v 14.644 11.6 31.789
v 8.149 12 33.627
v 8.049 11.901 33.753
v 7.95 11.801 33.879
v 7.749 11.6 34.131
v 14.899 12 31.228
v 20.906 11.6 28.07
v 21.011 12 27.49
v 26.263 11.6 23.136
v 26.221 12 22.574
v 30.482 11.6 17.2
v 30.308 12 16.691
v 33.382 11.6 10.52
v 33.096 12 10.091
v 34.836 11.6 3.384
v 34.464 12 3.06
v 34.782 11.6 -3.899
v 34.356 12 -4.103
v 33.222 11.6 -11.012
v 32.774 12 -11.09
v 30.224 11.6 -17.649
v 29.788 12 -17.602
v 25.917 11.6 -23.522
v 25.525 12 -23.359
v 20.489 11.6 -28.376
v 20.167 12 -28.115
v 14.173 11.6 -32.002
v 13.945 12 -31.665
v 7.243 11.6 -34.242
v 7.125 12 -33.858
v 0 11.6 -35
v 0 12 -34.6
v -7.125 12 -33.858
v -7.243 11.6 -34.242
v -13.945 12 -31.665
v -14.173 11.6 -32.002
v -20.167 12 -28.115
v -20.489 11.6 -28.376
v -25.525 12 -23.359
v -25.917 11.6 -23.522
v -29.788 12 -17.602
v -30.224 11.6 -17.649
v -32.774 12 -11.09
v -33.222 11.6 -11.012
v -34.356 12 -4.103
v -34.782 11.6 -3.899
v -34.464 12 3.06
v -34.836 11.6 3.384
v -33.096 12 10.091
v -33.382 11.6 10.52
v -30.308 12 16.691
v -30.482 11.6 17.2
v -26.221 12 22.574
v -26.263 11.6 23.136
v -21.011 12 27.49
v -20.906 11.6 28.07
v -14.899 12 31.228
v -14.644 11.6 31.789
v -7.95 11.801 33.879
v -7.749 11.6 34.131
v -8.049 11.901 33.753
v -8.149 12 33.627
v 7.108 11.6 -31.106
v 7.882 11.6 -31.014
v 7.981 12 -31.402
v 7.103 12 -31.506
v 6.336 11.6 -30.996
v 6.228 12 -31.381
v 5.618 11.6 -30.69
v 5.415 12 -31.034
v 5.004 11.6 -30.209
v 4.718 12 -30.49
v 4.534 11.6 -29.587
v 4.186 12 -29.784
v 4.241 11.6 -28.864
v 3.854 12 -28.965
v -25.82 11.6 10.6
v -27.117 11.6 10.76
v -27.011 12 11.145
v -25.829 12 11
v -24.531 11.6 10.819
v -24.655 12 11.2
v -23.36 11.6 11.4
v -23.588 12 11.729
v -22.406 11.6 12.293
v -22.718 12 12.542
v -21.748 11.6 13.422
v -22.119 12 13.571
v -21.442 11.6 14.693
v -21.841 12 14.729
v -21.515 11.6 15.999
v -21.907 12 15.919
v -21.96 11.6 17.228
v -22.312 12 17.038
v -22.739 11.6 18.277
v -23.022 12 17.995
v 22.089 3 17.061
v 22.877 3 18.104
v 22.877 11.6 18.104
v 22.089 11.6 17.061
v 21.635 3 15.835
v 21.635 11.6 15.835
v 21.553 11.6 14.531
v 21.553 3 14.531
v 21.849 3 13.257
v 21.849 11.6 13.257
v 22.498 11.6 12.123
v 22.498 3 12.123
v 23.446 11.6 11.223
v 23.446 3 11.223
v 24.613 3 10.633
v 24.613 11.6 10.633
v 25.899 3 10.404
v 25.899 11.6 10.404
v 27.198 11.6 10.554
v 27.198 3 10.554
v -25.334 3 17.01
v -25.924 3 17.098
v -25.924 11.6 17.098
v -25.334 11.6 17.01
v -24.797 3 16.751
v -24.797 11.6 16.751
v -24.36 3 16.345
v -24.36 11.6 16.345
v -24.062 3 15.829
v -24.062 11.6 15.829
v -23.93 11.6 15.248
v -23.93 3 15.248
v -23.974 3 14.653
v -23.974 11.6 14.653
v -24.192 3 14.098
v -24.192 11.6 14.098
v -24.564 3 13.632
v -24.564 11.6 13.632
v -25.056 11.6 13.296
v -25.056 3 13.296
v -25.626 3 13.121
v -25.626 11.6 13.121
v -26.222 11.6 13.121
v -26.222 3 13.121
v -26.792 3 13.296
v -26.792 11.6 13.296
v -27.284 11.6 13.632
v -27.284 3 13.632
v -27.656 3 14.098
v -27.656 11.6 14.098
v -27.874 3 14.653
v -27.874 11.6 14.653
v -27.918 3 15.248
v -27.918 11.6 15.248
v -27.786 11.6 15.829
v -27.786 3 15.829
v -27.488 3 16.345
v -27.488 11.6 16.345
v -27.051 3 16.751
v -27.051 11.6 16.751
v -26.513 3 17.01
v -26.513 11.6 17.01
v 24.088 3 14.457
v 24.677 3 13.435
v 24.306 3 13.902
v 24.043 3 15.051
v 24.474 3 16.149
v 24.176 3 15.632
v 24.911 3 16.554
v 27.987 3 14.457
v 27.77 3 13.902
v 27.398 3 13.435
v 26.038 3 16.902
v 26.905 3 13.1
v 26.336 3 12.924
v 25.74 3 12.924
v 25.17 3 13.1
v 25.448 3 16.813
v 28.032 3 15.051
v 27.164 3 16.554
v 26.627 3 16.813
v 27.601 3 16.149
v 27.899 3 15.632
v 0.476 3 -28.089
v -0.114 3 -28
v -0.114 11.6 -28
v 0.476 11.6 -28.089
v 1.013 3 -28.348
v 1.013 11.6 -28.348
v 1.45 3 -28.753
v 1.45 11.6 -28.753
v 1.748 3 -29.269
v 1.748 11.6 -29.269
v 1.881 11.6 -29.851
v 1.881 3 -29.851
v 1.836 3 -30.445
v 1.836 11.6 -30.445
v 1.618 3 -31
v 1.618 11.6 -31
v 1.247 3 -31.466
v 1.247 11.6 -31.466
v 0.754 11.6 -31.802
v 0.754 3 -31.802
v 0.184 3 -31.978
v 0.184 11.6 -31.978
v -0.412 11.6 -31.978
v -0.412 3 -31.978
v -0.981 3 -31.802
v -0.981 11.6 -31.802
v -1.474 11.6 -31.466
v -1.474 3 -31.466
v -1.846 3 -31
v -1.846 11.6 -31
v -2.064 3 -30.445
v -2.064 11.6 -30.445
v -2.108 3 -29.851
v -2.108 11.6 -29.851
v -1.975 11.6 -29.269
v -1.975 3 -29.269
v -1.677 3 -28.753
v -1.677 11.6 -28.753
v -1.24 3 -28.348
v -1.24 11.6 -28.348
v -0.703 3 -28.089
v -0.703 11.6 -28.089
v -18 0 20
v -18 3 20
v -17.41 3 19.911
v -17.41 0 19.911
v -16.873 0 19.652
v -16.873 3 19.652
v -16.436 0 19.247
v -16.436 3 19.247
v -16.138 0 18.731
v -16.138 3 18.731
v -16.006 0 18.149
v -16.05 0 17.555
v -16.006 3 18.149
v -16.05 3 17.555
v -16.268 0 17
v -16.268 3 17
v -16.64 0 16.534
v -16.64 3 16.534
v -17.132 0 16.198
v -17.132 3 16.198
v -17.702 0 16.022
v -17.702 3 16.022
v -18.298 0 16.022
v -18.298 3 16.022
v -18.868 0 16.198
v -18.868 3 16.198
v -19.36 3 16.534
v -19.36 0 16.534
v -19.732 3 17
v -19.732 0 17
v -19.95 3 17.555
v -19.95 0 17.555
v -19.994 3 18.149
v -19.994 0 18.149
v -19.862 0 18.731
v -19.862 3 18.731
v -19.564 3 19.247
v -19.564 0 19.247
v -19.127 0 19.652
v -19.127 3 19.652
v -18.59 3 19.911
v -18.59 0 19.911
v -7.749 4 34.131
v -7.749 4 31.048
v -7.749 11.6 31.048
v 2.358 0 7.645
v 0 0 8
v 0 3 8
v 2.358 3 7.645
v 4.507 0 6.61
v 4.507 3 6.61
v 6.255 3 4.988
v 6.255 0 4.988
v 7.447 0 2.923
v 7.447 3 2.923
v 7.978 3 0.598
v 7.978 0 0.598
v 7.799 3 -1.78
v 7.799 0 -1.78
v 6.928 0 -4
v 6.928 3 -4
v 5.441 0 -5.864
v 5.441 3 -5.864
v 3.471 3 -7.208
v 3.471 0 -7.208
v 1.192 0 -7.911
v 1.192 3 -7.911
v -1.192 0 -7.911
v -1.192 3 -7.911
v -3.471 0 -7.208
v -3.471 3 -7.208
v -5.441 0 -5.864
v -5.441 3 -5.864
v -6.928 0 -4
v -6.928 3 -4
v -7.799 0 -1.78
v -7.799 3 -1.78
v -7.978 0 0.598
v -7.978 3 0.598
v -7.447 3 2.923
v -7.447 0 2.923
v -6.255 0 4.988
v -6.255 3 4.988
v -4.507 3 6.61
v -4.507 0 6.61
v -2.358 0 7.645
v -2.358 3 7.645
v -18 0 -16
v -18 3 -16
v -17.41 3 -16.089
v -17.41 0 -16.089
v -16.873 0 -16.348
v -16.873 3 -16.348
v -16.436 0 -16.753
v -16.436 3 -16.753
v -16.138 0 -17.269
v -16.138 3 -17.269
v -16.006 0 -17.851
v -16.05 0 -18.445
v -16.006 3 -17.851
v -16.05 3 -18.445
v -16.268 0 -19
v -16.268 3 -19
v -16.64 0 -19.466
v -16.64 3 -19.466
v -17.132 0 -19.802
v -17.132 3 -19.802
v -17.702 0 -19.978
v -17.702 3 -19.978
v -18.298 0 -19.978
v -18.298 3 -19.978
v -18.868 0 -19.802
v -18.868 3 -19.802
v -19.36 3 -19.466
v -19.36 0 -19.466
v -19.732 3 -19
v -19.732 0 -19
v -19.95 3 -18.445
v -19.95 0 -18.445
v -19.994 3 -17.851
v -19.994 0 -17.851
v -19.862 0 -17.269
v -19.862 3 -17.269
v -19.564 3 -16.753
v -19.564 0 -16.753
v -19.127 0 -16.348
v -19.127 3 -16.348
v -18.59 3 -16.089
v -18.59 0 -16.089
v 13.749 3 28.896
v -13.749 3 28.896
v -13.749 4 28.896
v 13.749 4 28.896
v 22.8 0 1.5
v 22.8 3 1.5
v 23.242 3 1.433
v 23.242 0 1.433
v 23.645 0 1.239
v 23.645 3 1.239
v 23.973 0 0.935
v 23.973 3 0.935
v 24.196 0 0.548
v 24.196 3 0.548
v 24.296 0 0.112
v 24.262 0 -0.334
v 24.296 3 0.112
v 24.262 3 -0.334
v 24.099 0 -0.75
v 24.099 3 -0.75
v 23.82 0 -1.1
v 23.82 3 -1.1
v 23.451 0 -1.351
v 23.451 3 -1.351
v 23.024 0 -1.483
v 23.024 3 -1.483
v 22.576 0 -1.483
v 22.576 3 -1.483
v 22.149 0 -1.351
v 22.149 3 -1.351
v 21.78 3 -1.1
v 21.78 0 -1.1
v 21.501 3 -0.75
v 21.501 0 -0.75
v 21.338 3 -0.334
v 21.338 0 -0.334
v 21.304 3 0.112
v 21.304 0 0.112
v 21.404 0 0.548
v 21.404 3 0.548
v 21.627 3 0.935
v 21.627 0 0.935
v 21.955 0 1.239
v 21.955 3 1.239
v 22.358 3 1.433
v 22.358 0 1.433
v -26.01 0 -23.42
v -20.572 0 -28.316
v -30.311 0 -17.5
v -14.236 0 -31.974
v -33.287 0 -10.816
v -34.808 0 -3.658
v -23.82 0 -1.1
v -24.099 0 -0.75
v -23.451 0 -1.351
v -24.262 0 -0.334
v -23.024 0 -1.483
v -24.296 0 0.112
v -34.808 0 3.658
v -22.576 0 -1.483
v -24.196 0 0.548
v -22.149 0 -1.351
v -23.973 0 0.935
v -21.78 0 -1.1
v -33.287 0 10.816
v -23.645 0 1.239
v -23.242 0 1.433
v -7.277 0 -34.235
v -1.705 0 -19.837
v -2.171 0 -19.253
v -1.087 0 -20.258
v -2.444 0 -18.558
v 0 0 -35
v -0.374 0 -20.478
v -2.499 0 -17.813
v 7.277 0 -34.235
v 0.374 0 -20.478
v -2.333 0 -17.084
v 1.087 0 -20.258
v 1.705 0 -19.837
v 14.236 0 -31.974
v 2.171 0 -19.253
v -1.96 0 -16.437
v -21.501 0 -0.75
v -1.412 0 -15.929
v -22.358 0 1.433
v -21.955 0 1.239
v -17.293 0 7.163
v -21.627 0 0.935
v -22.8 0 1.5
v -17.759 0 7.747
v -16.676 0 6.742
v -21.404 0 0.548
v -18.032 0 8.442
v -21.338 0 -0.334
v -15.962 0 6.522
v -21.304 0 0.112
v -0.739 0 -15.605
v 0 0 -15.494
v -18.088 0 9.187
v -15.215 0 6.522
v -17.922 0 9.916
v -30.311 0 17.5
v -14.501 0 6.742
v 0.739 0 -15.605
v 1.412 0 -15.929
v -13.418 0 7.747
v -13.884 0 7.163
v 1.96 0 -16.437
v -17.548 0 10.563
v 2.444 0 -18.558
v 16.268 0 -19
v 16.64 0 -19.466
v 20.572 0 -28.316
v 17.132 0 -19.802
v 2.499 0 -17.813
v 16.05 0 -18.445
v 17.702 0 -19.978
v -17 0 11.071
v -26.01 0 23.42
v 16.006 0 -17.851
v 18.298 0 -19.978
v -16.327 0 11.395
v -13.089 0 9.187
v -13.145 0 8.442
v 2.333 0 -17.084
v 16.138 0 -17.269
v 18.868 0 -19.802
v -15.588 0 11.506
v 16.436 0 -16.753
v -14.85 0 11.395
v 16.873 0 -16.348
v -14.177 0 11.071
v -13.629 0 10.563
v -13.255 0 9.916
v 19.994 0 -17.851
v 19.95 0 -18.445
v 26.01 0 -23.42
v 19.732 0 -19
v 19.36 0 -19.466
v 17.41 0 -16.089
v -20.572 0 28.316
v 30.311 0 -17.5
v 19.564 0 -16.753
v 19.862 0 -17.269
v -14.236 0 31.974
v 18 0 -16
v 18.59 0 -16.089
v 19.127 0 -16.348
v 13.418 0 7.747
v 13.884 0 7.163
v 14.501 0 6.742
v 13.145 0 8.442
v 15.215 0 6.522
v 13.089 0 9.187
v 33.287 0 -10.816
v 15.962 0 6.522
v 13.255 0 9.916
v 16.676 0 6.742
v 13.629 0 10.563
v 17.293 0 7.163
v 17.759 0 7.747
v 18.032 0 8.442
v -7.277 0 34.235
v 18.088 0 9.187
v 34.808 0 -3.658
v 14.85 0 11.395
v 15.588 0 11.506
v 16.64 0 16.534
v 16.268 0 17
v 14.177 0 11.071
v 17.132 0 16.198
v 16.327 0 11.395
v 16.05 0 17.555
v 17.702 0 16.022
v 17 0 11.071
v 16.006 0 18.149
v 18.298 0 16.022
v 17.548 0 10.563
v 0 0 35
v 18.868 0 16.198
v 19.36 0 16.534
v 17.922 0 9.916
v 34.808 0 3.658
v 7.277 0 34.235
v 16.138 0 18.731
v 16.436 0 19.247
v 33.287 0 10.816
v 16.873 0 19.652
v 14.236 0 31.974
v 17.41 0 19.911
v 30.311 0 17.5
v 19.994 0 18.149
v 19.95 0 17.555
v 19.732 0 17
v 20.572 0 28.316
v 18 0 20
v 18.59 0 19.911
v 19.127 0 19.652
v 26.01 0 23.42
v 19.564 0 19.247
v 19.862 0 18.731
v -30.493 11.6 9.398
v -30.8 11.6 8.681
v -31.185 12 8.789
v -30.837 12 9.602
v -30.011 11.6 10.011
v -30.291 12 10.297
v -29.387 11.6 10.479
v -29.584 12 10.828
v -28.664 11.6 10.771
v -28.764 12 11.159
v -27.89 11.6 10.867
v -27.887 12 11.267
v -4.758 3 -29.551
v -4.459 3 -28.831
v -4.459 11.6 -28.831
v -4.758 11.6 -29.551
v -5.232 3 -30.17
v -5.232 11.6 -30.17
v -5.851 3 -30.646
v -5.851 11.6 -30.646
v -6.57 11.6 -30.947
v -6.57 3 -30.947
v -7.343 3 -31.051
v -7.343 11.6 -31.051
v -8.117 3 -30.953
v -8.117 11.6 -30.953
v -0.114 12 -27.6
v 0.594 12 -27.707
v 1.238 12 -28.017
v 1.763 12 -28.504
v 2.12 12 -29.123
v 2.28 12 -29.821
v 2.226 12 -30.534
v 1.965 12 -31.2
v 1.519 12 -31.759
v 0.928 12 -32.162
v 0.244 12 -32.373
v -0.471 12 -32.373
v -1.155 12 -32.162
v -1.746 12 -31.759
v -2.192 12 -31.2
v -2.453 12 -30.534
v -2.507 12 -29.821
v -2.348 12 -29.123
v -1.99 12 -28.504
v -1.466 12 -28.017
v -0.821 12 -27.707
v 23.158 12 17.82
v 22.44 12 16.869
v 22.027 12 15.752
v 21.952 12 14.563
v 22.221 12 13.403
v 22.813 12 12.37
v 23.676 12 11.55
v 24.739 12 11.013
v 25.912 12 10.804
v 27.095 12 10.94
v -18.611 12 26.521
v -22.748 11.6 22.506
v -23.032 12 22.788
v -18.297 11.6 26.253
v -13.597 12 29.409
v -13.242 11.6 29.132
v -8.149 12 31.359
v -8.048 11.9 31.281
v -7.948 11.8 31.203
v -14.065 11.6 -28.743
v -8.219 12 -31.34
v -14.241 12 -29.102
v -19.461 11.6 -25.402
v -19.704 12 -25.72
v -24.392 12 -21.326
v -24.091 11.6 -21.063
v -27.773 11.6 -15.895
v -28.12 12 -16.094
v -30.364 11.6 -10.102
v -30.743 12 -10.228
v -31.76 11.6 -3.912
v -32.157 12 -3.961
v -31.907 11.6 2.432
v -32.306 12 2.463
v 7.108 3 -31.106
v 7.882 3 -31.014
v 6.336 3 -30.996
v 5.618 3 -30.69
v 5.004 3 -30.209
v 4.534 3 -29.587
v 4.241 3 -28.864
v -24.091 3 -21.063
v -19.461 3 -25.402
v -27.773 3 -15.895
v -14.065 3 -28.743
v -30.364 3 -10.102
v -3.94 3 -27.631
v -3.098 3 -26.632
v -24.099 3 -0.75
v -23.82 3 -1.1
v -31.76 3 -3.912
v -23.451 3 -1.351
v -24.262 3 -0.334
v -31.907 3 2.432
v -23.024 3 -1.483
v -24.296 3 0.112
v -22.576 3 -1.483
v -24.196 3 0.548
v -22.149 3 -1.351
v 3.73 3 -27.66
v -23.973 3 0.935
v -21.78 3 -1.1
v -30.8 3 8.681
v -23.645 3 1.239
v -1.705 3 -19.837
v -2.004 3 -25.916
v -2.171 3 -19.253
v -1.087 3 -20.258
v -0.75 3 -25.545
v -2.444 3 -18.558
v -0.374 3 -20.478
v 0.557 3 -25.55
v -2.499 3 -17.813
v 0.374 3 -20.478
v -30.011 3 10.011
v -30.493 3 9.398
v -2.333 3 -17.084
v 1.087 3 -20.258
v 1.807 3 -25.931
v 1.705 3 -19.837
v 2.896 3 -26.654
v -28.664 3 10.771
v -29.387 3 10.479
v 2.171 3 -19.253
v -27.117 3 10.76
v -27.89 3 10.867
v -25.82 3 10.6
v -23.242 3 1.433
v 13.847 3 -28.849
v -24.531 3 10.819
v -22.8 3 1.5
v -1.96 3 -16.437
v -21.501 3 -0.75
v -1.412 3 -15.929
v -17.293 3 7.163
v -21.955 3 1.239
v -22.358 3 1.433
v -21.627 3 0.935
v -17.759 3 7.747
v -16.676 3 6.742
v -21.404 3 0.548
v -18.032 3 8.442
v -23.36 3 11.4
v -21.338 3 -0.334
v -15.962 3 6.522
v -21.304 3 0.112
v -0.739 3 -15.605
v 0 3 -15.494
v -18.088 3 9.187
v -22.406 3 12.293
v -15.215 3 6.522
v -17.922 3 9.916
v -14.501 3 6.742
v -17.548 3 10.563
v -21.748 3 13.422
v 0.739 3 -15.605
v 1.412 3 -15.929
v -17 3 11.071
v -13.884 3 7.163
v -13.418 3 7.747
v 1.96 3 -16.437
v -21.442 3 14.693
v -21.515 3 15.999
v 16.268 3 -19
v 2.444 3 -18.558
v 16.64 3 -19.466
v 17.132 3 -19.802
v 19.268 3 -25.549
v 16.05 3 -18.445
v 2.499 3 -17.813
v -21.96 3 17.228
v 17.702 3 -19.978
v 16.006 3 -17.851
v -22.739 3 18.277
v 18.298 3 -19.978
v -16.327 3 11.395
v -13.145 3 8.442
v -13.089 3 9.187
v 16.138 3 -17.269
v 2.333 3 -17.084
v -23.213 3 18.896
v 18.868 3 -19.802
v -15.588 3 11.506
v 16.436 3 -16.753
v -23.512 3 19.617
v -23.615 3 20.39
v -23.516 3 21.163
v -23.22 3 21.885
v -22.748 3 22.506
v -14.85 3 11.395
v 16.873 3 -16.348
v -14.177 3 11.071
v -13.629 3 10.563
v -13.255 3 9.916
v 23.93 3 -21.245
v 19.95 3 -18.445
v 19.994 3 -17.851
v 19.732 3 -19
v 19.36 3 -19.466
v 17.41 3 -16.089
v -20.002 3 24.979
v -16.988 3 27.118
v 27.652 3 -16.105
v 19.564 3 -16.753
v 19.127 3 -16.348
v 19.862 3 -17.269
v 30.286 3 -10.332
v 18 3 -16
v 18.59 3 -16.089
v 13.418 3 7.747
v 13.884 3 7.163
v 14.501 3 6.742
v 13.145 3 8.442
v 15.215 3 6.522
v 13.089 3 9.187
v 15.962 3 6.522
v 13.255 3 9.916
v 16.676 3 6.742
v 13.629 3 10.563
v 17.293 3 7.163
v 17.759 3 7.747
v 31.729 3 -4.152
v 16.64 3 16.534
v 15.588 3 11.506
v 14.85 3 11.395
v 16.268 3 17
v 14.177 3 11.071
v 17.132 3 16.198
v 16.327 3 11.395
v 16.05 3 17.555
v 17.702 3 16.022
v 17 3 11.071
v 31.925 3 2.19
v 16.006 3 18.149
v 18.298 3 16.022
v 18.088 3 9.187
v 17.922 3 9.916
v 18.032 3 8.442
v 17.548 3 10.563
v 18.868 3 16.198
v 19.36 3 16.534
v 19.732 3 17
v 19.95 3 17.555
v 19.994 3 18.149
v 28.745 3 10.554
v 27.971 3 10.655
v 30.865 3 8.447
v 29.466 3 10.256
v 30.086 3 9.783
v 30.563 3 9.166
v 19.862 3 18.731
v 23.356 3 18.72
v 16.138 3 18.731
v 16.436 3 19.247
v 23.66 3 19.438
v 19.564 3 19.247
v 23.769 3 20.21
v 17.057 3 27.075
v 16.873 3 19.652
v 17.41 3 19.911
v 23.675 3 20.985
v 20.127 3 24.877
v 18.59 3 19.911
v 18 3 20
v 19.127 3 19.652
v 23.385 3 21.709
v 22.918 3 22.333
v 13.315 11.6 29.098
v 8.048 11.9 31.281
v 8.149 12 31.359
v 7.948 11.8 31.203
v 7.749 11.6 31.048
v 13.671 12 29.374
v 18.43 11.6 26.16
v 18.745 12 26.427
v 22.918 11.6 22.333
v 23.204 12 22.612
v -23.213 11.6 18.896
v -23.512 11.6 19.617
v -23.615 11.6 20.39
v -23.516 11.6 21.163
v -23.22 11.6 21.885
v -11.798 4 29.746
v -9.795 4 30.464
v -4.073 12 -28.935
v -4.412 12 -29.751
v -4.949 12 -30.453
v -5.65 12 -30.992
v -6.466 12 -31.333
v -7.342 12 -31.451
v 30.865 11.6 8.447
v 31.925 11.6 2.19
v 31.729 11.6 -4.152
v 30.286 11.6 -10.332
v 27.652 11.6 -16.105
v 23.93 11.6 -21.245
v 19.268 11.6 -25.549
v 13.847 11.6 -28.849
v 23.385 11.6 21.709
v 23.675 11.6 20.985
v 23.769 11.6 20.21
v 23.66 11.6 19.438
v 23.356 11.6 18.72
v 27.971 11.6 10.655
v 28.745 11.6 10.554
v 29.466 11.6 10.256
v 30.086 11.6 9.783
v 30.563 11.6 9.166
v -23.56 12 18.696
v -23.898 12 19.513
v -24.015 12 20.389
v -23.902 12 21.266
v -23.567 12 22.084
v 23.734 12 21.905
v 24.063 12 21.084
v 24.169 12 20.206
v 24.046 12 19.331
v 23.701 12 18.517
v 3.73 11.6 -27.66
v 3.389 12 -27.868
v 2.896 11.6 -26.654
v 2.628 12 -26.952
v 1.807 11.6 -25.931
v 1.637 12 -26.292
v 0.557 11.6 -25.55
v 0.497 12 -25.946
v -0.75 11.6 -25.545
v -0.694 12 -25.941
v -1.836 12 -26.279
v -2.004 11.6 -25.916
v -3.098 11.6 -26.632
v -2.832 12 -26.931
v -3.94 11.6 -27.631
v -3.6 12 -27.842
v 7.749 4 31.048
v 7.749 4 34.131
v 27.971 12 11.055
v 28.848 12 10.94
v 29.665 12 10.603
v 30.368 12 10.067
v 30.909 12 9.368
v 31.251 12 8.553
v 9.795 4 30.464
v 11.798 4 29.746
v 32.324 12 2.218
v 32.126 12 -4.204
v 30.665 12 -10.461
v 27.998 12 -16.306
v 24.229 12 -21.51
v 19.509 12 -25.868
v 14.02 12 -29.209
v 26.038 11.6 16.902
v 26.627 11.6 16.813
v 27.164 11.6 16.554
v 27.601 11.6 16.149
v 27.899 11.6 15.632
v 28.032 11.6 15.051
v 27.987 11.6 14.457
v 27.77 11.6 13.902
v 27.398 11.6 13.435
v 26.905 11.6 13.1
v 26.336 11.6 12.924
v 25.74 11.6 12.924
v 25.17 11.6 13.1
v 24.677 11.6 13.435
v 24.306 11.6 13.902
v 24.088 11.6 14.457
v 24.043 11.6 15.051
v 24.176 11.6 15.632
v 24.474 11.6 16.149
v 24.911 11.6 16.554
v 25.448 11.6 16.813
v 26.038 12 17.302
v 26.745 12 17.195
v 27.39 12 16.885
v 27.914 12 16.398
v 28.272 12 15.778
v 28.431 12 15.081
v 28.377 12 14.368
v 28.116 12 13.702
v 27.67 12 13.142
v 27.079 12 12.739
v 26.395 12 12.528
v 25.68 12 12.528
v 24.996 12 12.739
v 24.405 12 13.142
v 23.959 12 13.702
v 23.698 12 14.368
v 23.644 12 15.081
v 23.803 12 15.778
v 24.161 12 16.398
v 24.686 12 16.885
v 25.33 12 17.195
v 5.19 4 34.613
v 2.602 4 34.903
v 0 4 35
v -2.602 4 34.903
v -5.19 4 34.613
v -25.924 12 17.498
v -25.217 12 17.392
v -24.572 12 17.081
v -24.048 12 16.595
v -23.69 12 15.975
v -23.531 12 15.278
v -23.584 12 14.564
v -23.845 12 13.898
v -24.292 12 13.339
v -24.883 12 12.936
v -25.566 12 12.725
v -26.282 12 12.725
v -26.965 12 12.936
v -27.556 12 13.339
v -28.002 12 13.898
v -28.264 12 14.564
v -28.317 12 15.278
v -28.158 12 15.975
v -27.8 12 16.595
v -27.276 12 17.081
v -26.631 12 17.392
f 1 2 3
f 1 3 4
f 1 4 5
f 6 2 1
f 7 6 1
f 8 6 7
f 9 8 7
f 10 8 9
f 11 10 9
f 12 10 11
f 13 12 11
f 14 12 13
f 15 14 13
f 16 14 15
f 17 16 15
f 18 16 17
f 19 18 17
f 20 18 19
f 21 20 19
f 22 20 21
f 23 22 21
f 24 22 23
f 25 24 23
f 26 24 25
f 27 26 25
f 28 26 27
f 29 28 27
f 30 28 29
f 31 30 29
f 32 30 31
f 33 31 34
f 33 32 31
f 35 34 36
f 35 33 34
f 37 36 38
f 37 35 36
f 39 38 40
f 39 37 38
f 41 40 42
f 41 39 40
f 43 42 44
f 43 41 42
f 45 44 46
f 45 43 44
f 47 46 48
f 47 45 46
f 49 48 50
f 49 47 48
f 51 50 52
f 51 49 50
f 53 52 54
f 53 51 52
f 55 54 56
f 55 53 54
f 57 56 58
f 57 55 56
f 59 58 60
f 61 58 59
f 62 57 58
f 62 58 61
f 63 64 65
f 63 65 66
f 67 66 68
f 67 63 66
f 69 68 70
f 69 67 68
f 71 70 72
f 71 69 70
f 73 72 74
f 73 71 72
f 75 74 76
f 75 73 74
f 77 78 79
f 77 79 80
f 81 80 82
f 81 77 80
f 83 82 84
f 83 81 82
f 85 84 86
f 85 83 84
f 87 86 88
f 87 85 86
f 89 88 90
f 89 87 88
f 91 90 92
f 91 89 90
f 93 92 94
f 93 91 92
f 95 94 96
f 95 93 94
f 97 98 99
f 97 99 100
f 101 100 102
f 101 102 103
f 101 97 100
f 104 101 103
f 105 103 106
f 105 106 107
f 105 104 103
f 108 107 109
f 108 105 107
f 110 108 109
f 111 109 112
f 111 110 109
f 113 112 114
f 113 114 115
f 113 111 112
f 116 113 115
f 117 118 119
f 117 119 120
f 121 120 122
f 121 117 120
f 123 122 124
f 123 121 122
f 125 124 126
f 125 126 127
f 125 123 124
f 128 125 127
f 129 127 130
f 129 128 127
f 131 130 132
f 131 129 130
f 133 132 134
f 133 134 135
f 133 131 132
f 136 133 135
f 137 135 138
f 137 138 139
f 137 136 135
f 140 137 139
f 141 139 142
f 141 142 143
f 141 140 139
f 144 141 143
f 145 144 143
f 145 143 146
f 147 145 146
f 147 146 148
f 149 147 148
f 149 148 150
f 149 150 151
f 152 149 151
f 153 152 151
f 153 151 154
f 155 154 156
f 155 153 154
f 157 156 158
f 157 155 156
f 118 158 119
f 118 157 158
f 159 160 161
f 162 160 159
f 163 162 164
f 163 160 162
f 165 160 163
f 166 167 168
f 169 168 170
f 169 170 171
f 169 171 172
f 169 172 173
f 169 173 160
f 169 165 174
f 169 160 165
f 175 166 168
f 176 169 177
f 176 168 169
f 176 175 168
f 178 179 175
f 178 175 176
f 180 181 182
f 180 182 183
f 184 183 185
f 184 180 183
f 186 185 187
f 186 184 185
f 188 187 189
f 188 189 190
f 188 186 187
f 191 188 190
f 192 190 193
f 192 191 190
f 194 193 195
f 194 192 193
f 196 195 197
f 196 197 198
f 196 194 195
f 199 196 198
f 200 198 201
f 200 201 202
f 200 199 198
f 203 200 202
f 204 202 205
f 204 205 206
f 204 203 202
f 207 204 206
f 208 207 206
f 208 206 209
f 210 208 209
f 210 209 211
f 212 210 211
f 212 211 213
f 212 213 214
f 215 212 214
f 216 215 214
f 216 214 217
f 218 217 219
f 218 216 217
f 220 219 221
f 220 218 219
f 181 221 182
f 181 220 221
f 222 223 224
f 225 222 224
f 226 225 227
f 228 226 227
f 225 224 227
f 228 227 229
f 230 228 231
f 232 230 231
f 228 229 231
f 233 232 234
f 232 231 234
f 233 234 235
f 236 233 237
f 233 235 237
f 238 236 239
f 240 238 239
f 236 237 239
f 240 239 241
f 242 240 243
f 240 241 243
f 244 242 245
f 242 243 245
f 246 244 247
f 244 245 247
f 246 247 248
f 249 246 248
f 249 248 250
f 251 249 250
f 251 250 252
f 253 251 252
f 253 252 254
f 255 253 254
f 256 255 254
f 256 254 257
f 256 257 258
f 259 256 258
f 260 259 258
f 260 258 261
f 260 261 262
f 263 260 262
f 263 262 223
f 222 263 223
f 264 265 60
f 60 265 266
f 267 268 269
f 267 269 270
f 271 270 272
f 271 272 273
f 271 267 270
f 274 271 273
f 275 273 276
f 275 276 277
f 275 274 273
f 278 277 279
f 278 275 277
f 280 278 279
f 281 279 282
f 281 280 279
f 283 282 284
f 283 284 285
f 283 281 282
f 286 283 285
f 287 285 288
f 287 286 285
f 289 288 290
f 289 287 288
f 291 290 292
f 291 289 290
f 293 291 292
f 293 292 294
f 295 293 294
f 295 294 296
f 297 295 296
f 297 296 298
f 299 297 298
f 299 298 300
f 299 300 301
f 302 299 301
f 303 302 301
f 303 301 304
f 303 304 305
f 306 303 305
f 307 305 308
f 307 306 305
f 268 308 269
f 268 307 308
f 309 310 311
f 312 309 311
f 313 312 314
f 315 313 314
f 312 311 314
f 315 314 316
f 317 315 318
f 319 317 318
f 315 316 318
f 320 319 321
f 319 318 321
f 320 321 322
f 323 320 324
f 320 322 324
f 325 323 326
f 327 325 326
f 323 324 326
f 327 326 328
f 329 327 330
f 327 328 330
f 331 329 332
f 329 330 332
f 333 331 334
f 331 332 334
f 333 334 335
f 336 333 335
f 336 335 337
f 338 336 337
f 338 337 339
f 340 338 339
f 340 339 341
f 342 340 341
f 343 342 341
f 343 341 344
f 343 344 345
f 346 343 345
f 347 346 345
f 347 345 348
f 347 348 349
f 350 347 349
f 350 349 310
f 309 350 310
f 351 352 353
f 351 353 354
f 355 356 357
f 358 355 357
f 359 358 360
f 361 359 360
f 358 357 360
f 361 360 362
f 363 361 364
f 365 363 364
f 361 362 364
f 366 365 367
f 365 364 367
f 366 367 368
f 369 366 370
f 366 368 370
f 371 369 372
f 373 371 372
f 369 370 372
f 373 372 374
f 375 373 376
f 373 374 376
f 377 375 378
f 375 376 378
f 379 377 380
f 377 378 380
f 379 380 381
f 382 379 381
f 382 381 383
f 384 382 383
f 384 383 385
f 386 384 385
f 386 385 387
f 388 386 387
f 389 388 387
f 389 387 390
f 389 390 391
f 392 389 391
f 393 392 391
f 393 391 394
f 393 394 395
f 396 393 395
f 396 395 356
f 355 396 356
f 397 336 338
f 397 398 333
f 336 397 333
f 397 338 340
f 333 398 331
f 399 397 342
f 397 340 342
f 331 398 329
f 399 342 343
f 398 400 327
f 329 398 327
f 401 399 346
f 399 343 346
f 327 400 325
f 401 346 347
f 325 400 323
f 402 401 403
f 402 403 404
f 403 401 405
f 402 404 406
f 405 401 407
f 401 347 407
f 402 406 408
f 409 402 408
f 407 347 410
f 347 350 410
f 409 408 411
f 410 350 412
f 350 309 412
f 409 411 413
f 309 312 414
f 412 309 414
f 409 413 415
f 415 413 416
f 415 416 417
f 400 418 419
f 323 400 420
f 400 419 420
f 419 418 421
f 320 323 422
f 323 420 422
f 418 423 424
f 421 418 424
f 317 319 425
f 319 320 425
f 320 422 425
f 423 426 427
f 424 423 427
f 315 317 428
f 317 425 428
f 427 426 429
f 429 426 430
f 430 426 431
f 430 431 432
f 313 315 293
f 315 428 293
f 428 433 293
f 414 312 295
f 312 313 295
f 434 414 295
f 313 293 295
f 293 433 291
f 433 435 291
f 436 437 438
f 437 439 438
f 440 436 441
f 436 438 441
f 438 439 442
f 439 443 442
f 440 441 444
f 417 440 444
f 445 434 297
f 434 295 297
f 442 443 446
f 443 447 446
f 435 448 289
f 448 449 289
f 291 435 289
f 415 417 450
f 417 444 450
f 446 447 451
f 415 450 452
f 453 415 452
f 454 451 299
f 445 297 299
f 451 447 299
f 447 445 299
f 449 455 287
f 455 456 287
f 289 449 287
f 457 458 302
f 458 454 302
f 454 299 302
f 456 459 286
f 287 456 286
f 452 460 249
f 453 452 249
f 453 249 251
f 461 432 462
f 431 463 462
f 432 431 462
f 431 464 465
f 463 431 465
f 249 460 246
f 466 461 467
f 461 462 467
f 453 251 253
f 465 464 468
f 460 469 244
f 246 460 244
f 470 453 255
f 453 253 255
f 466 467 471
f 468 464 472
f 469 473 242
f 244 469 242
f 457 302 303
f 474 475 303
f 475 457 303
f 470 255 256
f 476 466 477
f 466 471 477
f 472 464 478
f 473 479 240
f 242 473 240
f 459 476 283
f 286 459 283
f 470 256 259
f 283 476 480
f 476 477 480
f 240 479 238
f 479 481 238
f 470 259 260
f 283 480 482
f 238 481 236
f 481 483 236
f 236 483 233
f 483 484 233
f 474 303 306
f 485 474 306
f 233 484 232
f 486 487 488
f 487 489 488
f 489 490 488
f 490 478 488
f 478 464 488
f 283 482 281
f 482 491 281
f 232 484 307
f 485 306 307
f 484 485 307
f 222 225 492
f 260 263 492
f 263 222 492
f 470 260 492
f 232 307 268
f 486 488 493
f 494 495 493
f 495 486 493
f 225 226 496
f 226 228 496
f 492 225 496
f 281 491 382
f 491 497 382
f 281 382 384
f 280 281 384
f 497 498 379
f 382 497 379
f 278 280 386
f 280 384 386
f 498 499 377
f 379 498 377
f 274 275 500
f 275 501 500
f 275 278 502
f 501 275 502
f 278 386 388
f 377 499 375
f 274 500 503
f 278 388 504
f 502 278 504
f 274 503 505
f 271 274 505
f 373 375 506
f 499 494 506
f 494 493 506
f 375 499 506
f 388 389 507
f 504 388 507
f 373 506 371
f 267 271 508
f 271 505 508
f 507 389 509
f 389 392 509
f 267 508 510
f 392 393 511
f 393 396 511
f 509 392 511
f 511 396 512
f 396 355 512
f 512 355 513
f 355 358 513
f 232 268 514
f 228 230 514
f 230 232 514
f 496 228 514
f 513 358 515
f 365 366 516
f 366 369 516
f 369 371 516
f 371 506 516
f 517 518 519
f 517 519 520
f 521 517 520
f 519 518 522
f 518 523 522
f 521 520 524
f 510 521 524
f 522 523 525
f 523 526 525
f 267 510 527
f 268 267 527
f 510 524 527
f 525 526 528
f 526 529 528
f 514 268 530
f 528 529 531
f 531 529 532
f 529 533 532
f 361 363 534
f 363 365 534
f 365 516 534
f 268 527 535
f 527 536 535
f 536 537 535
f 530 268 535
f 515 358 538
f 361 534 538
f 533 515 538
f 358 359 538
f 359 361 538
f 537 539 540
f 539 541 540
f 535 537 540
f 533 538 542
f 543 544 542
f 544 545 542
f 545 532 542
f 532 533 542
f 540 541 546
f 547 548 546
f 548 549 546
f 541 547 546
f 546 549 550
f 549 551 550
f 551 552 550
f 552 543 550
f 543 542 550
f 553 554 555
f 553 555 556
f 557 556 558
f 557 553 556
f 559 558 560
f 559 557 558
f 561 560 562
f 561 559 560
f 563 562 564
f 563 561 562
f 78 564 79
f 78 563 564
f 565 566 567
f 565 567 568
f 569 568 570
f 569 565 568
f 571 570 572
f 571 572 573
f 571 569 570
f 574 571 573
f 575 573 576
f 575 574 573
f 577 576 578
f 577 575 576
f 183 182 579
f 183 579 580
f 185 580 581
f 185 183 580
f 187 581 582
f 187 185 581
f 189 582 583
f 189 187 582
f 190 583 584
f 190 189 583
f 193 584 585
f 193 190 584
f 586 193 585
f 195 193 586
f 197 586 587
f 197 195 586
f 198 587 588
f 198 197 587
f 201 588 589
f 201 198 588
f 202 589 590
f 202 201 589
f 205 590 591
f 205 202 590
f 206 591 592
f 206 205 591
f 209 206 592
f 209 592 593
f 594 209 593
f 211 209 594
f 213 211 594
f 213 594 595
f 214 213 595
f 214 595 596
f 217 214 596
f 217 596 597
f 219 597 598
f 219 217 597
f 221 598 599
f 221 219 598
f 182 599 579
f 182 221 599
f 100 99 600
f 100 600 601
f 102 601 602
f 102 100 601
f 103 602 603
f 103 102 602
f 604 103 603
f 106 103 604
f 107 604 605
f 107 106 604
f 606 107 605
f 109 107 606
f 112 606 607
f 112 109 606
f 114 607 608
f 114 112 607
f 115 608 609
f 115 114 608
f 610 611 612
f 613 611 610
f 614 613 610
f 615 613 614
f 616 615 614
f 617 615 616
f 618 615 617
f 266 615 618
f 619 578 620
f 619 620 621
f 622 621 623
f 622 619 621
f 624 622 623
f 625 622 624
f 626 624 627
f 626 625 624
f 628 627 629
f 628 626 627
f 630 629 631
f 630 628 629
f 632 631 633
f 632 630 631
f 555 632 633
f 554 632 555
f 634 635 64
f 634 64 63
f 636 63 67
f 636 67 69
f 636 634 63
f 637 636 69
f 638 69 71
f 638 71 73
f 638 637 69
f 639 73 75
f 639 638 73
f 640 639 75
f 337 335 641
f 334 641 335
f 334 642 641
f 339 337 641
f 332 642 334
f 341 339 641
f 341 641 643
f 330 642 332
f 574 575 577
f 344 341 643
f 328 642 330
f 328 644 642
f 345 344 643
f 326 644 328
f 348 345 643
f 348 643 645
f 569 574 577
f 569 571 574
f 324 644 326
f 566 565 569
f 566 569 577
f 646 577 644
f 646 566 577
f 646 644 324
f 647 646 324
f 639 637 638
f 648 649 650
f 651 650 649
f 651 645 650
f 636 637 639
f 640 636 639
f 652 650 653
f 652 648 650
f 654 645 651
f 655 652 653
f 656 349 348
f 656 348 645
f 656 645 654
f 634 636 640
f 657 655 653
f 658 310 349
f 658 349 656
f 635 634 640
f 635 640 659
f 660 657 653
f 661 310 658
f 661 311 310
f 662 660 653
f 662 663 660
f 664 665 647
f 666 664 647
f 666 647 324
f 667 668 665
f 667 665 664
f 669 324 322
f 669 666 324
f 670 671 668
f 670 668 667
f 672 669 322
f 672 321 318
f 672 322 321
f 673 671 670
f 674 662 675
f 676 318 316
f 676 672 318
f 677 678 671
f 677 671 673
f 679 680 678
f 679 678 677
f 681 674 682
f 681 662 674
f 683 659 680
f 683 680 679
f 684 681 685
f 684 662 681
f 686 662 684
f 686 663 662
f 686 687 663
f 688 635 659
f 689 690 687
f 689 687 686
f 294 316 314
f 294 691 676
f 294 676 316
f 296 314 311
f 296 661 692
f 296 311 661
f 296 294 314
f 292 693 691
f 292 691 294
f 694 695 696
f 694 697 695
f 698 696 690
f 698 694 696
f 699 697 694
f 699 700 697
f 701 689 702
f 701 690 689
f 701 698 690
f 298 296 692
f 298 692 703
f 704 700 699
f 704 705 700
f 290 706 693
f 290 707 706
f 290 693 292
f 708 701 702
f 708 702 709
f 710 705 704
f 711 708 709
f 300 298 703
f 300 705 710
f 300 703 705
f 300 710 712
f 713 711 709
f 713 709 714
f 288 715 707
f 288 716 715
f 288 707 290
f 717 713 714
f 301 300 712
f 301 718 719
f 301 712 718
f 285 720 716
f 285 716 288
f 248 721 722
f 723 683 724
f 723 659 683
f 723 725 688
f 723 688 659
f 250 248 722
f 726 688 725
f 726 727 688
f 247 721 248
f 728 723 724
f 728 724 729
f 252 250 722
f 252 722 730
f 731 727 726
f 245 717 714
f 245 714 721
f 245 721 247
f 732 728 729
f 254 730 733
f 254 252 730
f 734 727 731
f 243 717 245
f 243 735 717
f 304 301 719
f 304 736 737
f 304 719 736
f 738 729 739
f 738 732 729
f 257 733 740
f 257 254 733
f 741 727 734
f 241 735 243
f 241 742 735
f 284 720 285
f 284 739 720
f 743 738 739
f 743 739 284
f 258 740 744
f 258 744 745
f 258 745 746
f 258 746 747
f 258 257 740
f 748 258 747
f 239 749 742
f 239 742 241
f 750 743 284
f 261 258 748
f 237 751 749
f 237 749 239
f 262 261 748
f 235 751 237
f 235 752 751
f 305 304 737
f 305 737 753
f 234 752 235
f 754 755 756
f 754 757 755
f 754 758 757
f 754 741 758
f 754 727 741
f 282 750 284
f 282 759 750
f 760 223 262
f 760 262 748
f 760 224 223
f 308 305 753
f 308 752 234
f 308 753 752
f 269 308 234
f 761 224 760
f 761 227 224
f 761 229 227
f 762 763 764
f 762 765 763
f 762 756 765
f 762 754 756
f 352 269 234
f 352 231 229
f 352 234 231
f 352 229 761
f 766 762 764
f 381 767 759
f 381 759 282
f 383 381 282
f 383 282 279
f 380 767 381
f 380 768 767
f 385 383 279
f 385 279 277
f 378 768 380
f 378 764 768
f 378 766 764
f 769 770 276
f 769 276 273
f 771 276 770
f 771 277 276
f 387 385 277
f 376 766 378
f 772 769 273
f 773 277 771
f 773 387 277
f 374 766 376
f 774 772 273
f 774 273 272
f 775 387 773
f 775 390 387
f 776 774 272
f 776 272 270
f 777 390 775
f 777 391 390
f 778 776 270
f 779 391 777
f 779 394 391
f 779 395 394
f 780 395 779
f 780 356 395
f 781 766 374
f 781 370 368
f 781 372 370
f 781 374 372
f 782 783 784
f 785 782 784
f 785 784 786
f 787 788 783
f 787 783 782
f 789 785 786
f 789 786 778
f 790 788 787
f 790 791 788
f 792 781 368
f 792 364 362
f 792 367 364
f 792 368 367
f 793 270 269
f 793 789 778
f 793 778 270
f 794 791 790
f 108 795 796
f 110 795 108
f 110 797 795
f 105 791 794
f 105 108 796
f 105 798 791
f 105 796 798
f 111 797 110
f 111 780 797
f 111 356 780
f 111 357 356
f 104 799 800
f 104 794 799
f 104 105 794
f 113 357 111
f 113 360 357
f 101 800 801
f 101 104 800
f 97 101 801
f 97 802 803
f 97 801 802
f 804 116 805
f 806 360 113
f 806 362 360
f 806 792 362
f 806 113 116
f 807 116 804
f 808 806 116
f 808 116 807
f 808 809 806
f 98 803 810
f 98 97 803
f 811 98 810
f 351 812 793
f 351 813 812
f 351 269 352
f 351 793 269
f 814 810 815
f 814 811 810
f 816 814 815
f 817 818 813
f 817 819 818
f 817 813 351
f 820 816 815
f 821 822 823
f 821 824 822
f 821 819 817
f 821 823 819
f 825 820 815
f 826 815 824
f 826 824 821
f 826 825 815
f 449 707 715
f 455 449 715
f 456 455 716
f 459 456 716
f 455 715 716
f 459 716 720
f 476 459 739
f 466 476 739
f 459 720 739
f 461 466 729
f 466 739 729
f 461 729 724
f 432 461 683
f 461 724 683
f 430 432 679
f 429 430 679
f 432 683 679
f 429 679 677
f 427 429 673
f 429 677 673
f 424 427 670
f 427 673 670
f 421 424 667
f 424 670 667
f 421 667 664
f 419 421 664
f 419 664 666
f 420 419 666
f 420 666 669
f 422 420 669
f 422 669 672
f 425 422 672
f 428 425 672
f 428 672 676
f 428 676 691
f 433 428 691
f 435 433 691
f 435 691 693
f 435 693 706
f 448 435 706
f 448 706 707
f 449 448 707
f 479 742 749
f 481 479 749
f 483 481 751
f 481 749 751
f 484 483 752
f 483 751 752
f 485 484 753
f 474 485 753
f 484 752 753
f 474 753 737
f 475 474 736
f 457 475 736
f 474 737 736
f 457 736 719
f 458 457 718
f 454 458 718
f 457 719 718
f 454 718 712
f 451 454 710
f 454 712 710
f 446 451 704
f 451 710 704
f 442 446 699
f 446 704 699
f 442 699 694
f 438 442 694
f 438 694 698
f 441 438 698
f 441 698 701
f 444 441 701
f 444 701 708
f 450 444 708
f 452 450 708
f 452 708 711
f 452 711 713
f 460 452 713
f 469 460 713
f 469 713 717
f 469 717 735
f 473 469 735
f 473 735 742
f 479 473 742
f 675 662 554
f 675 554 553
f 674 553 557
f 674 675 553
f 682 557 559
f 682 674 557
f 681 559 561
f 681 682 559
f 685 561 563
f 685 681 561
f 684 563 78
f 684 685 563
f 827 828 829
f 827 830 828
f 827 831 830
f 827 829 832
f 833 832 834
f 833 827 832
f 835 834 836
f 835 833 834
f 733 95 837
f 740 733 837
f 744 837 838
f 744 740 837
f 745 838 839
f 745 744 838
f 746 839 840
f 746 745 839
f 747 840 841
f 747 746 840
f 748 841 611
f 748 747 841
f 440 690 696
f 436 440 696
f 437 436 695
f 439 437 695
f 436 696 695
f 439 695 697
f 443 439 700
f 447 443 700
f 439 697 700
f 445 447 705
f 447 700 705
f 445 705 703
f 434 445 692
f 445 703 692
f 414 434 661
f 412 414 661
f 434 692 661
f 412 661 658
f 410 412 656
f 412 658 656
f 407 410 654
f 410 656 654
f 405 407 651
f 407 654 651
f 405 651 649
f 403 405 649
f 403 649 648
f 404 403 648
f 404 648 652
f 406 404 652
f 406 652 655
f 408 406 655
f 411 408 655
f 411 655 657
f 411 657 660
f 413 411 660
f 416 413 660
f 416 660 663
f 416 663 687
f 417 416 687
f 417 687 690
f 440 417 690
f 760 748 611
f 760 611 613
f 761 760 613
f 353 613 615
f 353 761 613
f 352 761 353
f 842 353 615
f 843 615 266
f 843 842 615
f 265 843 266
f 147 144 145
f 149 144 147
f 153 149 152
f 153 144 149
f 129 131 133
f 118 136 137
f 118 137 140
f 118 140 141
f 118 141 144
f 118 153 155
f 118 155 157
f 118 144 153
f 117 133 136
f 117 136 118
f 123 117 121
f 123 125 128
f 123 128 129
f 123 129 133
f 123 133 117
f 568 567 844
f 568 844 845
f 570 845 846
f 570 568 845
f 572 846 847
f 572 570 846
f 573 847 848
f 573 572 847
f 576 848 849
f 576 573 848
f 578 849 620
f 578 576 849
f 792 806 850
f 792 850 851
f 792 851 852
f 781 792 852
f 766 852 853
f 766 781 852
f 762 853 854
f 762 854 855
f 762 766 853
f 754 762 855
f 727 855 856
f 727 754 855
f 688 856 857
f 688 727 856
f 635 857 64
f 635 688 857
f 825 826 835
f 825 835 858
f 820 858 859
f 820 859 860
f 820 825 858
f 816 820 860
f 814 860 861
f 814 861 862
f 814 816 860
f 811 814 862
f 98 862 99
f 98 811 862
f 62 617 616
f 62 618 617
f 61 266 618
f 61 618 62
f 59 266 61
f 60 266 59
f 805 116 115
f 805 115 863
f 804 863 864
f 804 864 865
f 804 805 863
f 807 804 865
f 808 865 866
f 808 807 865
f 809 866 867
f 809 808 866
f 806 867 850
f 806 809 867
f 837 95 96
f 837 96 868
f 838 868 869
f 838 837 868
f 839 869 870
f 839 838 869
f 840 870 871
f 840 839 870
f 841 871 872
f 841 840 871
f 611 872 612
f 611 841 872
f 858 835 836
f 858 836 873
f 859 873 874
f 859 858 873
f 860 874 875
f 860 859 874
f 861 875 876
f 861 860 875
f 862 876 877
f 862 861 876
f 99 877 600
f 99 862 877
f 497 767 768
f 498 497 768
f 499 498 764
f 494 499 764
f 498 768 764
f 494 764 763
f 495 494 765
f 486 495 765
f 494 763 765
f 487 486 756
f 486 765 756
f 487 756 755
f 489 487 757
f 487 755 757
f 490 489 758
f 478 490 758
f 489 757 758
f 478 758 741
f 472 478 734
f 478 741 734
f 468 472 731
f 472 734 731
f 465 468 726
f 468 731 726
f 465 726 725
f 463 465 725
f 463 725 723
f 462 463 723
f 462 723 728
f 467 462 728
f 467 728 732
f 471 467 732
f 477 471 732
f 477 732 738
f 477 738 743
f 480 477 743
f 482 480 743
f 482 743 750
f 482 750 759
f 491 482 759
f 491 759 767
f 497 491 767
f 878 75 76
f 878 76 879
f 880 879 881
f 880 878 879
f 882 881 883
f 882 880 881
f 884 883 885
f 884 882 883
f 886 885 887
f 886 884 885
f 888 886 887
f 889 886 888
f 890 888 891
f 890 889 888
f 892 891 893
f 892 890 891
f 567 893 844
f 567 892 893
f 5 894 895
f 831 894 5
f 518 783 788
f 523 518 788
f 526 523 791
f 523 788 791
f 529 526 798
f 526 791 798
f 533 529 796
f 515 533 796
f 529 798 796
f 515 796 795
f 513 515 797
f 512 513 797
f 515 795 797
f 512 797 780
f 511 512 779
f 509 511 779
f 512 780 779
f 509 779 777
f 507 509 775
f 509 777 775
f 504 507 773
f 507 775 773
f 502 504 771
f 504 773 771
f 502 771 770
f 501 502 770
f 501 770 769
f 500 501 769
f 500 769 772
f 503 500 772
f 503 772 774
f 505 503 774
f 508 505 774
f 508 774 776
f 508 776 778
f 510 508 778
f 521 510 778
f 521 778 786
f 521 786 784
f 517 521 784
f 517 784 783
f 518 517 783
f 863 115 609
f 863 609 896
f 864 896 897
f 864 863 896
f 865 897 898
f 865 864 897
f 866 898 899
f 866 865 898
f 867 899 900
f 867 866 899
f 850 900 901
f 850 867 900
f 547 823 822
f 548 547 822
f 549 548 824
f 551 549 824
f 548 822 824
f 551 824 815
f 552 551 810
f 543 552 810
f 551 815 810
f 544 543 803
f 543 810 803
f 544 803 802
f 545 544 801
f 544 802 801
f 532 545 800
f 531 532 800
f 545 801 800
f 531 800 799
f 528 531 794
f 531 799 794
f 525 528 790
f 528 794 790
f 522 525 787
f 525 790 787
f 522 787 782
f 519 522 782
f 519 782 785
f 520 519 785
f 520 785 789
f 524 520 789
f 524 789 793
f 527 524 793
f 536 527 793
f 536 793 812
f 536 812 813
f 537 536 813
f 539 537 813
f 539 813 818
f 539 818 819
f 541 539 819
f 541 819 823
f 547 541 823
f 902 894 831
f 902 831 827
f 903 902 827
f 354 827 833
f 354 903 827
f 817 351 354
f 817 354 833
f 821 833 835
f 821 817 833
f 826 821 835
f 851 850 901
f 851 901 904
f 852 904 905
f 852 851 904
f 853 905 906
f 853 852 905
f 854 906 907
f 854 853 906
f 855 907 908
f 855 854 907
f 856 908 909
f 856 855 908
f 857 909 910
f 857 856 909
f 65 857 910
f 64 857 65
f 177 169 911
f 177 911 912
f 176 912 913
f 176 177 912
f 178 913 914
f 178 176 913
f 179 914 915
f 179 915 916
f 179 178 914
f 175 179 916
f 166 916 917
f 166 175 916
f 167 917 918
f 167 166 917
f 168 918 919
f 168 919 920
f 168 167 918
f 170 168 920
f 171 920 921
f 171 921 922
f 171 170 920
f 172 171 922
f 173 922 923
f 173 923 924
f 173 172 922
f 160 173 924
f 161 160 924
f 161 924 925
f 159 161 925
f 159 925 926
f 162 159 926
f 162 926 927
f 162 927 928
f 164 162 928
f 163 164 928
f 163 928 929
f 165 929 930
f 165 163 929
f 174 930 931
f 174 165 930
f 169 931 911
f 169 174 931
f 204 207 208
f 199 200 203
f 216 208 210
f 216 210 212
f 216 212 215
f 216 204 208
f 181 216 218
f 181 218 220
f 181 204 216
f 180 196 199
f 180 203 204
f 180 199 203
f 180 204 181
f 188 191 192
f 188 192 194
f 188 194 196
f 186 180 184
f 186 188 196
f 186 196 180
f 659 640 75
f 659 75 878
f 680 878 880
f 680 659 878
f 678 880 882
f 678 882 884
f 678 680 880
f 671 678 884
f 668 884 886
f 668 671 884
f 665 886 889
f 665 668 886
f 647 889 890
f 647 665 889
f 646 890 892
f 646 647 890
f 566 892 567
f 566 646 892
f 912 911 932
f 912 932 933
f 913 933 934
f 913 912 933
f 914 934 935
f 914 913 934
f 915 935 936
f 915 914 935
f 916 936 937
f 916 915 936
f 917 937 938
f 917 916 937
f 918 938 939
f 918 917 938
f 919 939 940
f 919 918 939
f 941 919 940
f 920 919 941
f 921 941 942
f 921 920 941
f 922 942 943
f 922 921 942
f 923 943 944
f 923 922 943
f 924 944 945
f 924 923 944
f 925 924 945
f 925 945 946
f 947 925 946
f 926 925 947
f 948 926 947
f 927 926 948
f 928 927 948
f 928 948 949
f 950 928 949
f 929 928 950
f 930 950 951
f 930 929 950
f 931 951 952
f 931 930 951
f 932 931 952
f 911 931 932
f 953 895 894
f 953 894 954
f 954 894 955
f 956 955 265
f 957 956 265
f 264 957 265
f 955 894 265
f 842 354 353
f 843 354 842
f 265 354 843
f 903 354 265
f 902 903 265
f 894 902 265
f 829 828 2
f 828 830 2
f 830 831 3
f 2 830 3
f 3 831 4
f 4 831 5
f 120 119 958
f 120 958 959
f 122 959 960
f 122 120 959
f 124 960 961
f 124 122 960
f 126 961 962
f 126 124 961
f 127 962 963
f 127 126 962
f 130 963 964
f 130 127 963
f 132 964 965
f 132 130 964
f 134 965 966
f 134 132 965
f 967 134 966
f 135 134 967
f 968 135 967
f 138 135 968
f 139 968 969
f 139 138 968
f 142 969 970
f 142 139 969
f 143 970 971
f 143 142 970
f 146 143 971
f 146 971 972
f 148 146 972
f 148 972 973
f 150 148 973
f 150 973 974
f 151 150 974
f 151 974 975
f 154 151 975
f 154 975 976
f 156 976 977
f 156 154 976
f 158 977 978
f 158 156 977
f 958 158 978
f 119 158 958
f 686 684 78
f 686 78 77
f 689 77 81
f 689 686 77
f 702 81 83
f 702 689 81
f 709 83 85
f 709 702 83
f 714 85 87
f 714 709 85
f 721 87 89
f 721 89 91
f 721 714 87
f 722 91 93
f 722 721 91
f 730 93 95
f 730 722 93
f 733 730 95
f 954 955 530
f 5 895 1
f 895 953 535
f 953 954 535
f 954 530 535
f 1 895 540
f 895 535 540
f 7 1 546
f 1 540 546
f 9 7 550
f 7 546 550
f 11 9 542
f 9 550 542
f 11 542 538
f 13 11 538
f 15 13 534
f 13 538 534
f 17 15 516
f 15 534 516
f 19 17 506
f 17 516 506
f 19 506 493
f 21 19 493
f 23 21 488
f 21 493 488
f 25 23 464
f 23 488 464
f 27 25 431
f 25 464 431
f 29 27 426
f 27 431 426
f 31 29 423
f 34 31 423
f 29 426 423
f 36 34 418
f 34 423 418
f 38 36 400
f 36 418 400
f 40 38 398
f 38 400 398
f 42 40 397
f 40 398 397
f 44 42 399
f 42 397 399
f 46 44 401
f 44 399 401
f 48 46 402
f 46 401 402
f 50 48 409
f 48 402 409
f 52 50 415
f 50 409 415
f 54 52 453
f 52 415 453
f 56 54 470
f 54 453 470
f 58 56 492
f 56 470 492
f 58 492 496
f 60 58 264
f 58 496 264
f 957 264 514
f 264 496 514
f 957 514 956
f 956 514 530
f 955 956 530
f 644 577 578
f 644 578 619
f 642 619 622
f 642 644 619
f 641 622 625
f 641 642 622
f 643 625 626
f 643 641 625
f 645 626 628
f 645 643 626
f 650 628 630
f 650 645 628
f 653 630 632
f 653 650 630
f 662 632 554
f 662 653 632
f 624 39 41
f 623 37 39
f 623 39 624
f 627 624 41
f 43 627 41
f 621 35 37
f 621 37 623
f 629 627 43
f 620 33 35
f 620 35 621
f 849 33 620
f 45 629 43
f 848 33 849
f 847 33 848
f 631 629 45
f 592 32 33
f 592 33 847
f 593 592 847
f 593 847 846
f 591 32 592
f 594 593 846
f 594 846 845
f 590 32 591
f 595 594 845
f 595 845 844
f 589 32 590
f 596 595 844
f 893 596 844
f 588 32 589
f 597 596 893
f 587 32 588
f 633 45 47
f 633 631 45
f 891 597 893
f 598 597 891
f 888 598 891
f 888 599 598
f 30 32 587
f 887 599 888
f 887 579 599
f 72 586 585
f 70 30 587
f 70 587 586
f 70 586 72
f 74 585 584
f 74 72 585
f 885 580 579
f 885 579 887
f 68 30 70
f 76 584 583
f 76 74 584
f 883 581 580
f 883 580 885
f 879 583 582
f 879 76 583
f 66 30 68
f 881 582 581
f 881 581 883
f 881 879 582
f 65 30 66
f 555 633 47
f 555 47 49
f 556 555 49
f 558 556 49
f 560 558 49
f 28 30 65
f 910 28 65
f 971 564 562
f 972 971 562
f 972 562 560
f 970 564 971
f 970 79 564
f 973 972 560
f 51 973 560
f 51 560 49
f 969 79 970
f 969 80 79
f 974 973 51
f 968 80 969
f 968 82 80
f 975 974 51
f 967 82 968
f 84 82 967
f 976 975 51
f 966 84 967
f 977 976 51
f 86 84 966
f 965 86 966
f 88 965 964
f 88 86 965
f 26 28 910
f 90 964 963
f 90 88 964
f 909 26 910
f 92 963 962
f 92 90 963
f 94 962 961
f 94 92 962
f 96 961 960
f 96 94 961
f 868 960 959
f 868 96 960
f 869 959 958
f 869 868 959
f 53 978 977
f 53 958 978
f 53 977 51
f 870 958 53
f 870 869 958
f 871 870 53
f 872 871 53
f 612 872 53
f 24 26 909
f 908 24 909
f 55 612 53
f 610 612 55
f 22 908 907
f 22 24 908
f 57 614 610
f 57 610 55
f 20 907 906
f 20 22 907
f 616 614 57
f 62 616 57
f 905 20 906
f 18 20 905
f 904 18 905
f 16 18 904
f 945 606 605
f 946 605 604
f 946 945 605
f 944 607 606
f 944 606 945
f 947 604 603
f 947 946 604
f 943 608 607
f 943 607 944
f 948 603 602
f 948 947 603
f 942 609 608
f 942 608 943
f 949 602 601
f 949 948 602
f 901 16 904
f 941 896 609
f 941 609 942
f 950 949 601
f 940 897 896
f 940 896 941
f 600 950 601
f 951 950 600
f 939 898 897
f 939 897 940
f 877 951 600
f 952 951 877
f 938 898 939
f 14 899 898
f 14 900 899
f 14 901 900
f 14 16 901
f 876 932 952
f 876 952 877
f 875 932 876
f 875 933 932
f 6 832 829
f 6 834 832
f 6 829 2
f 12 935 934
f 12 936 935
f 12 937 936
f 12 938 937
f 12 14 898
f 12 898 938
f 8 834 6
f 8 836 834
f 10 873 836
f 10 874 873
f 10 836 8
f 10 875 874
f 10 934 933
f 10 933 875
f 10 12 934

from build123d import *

# Parameters (mm, degrees)
SKETCH_1_R          = 35
SKETCH_1_R_2        = 8
EXTRUDE_1_DEPTH     = 3
SKETCH_2_R          = 35
SKETCH_2_R_2        = 2
EXTRUDE_2_DEPTH     = 9
SKETCH_3_R          = 1.5
CUT_EXTRUDE_1_DEPTH = 8
SKETCH_4_R          = 2.50640253
CUT_EXTRUDE_2_DEPTH = 8
SKETCH_7_R          = 2
CUT_EXTRUDE_4_DEPTH = 12
EXTRUDE_4_DEPTH     = 1
SKETCH_9_W          = 15.497656666
SKETCH_9_H          = 9.48184561
CUT_EXTRUDE_5_DEPTH = 11
CHAMFER_1_SIZE      = 0.4


with BuildPart() as part:
    # Эскиз1 → Бобышка-Вытянуть1 (new body)
    with BuildSketch(Plane(origin=(0, 0, 0), x_dir=(1, 0, 0), z_dir=(0, 1, 0))):
        with Locations(Location((0, 0, 0), (0, 0, 270))):
            Circle(SKETCH_1_R)
        with Locations(Location((0, 0, 0), (0, 0, 270))):
            Circle(SKETCH_1_R_2, mode=Mode.SUBTRACT)
    extrude(amount=EXTRUDE_1_DEPTH)

    # Эскиз2 → Бобышка-Вытянуть2 (add)
    with BuildSketch(Plane(origin=(0, 3, 0), x_dir=(1, 0, 0), z_dir=(0, 1, 0))):
        with Locations(Location((0, 0, 0), (0, 0, 270))):
            Circle(SKETCH_2_R)
        with Locations(Location((-0.113661048, 30, 0), (0, 0, 270))):
            Circle(SKETCH_2_R_2, mode=Mode.SUBTRACT)
        with Locations(Location((26.037592637, -14.901566645, 0), (0, 0, 270))):
            Circle(SKETCH_2_R_2, mode=Mode.SUBTRACT)
        with Locations(Location((-25.92393159, -15.098433355, 0), (0, 0, 270))):
            Circle(SKETCH_2_R_2, mode=Mode.SUBTRACT)
        with BuildLine():
            ThreePointArc((-8.117111797, 30.953392319), (-27.773232815, 15.894890343), (-30.80008796, -8.680701679))
            ThreePointArc((-30.80008796, -8.680701679), (-29.387206086, -10.479447295), (-27.117120464, -10.75950488))
            ThreePointArc((-27.117120464, -10.75950488), (-22.03536976, -12.833684606), (-22.738725961, -18.277185484))
            ThreePointArc((-22.738725961, -18.277185484), (-23.615248532, -20.389868414), (-22.747868184, -22.506321181))
            ThreePointArc((-22.747868184, -22.506321181), (0.121237581, -31.999770334), (22.917752157, -22.333307773))
            ThreePointArc((22.917752157, -22.333307773), (23.769070618, -20.210343369), (22.87656479, -18.10436276))
            ThreePointArc((22.87656479, -18.10436276), (22.131981773, -12.666347691), (27.197869919, -10.55372159))
            ThreePointArc((27.197869919, -10.55372159), (29.465768293, -10.256470938), (30.86497998, -8.447071138))
            ThreePointArc((30.86497998, -8.447071138), (27.651995235, 16.104879992), (7.882335804, 31.014009452))
            ThreePointArc((7.882335804, 31.014009452), (5.618135468, 30.689790665), (4.240555674, 28.863867639))
            ThreePointArc((4.240555674, 28.863867639), (-0.096612013, 25.500032297), (-4.459143958, 28.830907074))
            ThreePointArc((-4.459143958, 28.830907074), (-5.850519761, 30.646339352), (-8.117111797, 30.953392319))
        make_face(mode=Mode.SUBTRACT)
    extrude(amount=EXTRUDE_2_DEPTH)

    # Эскиз3 → Вырез-Вытянуть1 (cut)
    with BuildSketch(Plane(origin=(0, 3, 0), x_dir=(1, 0, 0), z_dir=(0, 1, 0))):
        with Locations(Location((22.8, 0, 0), (0, 0, 270))):
            Circle(SKETCH_3_R)
        with Locations(Location((-22.8, 0, 0), (0, 0, 270))):
            Circle(SKETCH_3_R)
    extrude(amount=-CUT_EXTRUDE_1_DEPTH, mode=Mode.SUBTRACT)

    # Эскиз4 → Вырез-Вытянуть2 (cut)
    with BuildSketch(Plane(origin=(0, 3, 0), x_dir=(1, 0, 0), z_dir=(0, 1, 0))):
        with Locations(Location((0, 18, 0), (0, 0, 270))):
            Circle(SKETCH_4_R)
        with Locations(Location((15.588457268, -9, 0), (0, 0, 270))):
            Circle(SKETCH_4_R)
        with Locations(Location((-15.588457268, -9, 0), (0, 0, 270))):
            Circle(SKETCH_4_R)
    extrude(amount=-CUT_EXTRUDE_2_DEPTH, mode=Mode.SUBTRACT)

    # Эскиз7 → Вырез-Вытянуть4 (cut)
    with BuildSketch(Plane(origin=(0, 3, 0), x_dir=(1, 0, 0), z_dir=(0, 1, 0))):
        with Locations(Location((-18, -18, 0), (0, 0, 270))):
            Circle(SKETCH_7_R)
        with Locations(Location((18, -18, 0), (0, 0, 270))):
            Circle(SKETCH_7_R)
        with Locations(Location((-18, 18, 0), (0, 0, 270))):
            Circle(SKETCH_7_R)
        with Locations(Location((18, 18, 0), (0, 0, 270))):
            Circle(SKETCH_7_R)
    extrude(amount=-CUT_EXTRUDE_4_DEPTH, mode=Mode.SUBTRACT)

    # Эскиз8 → Бобышка-Вытянуть4 (add)
    with BuildSketch(Plane(origin=(0, 3, 0), x_dir=(1, 0, 0), z_dir=(0, 1, 0))):
        with BuildLine():
            Line((-13.748828333, -28.895842598), (13.748828333, -28.895842598))
            ThreePointArc((13.748828333, -28.895842598), (0, -32), (-13.748828333, -28.895842598))
        make_face()
    extrude(amount=EXTRUDE_4_DEPTH)

    # Эскиз9 → Вырез-Вытянуть5 (cut)
    with BuildSketch(Plane(origin=(0, 0, 28.895842598), x_dir=(-1, 0, 0), z_dir=(0, 0, -1))):
        with Locations((0, 8.740922805)):
            Rectangle(SKETCH_9_W, SKETCH_9_H)
    extrude(amount=-CUT_EXTRUDE_5_DEPTH, mode=Mode.SUBTRACT)

    # Фаска1
    chamfer_1_edges = [part.edges().sort_by_distance(p)[0] for p in [
        (15.940347108, 12, 27.747168037),
        (7.748828333, 12, 32.589541055),
        (-7.748828333, 12, 32.589541055),
        (0, 12, -35),
        (-29.387206086, 12, 10.479447295),
        (-22.03536976, 12, 12.833684606),
        (-23.615248532, 12, 20.389868414),
        (-15.835107718, 12, 27.807361679),
        (23.769070618, 12, 20.210343369),
        (22.131981773, 12, 12.666347691),
        (29.465768293, 12, 10.256470938),
        (27.651995235, 12, -16.104879992),
        (5.618135468, 12, -30.689790665),
        (-0.096612013, 12, -25.500032297),
        (-5.850519761, 12, -30.646339352),
        (-27.773232815, 12, -15.894890343),
        (-0.113661048, 12, -32),
        (26.037592637, 12, 12.901566645),
        (-25.92393159, 12, 13.098433355),
    ]]
    chamfer(chamfer_1_edges, length=CHAMFER_1_SIZE)


solid = part.part
